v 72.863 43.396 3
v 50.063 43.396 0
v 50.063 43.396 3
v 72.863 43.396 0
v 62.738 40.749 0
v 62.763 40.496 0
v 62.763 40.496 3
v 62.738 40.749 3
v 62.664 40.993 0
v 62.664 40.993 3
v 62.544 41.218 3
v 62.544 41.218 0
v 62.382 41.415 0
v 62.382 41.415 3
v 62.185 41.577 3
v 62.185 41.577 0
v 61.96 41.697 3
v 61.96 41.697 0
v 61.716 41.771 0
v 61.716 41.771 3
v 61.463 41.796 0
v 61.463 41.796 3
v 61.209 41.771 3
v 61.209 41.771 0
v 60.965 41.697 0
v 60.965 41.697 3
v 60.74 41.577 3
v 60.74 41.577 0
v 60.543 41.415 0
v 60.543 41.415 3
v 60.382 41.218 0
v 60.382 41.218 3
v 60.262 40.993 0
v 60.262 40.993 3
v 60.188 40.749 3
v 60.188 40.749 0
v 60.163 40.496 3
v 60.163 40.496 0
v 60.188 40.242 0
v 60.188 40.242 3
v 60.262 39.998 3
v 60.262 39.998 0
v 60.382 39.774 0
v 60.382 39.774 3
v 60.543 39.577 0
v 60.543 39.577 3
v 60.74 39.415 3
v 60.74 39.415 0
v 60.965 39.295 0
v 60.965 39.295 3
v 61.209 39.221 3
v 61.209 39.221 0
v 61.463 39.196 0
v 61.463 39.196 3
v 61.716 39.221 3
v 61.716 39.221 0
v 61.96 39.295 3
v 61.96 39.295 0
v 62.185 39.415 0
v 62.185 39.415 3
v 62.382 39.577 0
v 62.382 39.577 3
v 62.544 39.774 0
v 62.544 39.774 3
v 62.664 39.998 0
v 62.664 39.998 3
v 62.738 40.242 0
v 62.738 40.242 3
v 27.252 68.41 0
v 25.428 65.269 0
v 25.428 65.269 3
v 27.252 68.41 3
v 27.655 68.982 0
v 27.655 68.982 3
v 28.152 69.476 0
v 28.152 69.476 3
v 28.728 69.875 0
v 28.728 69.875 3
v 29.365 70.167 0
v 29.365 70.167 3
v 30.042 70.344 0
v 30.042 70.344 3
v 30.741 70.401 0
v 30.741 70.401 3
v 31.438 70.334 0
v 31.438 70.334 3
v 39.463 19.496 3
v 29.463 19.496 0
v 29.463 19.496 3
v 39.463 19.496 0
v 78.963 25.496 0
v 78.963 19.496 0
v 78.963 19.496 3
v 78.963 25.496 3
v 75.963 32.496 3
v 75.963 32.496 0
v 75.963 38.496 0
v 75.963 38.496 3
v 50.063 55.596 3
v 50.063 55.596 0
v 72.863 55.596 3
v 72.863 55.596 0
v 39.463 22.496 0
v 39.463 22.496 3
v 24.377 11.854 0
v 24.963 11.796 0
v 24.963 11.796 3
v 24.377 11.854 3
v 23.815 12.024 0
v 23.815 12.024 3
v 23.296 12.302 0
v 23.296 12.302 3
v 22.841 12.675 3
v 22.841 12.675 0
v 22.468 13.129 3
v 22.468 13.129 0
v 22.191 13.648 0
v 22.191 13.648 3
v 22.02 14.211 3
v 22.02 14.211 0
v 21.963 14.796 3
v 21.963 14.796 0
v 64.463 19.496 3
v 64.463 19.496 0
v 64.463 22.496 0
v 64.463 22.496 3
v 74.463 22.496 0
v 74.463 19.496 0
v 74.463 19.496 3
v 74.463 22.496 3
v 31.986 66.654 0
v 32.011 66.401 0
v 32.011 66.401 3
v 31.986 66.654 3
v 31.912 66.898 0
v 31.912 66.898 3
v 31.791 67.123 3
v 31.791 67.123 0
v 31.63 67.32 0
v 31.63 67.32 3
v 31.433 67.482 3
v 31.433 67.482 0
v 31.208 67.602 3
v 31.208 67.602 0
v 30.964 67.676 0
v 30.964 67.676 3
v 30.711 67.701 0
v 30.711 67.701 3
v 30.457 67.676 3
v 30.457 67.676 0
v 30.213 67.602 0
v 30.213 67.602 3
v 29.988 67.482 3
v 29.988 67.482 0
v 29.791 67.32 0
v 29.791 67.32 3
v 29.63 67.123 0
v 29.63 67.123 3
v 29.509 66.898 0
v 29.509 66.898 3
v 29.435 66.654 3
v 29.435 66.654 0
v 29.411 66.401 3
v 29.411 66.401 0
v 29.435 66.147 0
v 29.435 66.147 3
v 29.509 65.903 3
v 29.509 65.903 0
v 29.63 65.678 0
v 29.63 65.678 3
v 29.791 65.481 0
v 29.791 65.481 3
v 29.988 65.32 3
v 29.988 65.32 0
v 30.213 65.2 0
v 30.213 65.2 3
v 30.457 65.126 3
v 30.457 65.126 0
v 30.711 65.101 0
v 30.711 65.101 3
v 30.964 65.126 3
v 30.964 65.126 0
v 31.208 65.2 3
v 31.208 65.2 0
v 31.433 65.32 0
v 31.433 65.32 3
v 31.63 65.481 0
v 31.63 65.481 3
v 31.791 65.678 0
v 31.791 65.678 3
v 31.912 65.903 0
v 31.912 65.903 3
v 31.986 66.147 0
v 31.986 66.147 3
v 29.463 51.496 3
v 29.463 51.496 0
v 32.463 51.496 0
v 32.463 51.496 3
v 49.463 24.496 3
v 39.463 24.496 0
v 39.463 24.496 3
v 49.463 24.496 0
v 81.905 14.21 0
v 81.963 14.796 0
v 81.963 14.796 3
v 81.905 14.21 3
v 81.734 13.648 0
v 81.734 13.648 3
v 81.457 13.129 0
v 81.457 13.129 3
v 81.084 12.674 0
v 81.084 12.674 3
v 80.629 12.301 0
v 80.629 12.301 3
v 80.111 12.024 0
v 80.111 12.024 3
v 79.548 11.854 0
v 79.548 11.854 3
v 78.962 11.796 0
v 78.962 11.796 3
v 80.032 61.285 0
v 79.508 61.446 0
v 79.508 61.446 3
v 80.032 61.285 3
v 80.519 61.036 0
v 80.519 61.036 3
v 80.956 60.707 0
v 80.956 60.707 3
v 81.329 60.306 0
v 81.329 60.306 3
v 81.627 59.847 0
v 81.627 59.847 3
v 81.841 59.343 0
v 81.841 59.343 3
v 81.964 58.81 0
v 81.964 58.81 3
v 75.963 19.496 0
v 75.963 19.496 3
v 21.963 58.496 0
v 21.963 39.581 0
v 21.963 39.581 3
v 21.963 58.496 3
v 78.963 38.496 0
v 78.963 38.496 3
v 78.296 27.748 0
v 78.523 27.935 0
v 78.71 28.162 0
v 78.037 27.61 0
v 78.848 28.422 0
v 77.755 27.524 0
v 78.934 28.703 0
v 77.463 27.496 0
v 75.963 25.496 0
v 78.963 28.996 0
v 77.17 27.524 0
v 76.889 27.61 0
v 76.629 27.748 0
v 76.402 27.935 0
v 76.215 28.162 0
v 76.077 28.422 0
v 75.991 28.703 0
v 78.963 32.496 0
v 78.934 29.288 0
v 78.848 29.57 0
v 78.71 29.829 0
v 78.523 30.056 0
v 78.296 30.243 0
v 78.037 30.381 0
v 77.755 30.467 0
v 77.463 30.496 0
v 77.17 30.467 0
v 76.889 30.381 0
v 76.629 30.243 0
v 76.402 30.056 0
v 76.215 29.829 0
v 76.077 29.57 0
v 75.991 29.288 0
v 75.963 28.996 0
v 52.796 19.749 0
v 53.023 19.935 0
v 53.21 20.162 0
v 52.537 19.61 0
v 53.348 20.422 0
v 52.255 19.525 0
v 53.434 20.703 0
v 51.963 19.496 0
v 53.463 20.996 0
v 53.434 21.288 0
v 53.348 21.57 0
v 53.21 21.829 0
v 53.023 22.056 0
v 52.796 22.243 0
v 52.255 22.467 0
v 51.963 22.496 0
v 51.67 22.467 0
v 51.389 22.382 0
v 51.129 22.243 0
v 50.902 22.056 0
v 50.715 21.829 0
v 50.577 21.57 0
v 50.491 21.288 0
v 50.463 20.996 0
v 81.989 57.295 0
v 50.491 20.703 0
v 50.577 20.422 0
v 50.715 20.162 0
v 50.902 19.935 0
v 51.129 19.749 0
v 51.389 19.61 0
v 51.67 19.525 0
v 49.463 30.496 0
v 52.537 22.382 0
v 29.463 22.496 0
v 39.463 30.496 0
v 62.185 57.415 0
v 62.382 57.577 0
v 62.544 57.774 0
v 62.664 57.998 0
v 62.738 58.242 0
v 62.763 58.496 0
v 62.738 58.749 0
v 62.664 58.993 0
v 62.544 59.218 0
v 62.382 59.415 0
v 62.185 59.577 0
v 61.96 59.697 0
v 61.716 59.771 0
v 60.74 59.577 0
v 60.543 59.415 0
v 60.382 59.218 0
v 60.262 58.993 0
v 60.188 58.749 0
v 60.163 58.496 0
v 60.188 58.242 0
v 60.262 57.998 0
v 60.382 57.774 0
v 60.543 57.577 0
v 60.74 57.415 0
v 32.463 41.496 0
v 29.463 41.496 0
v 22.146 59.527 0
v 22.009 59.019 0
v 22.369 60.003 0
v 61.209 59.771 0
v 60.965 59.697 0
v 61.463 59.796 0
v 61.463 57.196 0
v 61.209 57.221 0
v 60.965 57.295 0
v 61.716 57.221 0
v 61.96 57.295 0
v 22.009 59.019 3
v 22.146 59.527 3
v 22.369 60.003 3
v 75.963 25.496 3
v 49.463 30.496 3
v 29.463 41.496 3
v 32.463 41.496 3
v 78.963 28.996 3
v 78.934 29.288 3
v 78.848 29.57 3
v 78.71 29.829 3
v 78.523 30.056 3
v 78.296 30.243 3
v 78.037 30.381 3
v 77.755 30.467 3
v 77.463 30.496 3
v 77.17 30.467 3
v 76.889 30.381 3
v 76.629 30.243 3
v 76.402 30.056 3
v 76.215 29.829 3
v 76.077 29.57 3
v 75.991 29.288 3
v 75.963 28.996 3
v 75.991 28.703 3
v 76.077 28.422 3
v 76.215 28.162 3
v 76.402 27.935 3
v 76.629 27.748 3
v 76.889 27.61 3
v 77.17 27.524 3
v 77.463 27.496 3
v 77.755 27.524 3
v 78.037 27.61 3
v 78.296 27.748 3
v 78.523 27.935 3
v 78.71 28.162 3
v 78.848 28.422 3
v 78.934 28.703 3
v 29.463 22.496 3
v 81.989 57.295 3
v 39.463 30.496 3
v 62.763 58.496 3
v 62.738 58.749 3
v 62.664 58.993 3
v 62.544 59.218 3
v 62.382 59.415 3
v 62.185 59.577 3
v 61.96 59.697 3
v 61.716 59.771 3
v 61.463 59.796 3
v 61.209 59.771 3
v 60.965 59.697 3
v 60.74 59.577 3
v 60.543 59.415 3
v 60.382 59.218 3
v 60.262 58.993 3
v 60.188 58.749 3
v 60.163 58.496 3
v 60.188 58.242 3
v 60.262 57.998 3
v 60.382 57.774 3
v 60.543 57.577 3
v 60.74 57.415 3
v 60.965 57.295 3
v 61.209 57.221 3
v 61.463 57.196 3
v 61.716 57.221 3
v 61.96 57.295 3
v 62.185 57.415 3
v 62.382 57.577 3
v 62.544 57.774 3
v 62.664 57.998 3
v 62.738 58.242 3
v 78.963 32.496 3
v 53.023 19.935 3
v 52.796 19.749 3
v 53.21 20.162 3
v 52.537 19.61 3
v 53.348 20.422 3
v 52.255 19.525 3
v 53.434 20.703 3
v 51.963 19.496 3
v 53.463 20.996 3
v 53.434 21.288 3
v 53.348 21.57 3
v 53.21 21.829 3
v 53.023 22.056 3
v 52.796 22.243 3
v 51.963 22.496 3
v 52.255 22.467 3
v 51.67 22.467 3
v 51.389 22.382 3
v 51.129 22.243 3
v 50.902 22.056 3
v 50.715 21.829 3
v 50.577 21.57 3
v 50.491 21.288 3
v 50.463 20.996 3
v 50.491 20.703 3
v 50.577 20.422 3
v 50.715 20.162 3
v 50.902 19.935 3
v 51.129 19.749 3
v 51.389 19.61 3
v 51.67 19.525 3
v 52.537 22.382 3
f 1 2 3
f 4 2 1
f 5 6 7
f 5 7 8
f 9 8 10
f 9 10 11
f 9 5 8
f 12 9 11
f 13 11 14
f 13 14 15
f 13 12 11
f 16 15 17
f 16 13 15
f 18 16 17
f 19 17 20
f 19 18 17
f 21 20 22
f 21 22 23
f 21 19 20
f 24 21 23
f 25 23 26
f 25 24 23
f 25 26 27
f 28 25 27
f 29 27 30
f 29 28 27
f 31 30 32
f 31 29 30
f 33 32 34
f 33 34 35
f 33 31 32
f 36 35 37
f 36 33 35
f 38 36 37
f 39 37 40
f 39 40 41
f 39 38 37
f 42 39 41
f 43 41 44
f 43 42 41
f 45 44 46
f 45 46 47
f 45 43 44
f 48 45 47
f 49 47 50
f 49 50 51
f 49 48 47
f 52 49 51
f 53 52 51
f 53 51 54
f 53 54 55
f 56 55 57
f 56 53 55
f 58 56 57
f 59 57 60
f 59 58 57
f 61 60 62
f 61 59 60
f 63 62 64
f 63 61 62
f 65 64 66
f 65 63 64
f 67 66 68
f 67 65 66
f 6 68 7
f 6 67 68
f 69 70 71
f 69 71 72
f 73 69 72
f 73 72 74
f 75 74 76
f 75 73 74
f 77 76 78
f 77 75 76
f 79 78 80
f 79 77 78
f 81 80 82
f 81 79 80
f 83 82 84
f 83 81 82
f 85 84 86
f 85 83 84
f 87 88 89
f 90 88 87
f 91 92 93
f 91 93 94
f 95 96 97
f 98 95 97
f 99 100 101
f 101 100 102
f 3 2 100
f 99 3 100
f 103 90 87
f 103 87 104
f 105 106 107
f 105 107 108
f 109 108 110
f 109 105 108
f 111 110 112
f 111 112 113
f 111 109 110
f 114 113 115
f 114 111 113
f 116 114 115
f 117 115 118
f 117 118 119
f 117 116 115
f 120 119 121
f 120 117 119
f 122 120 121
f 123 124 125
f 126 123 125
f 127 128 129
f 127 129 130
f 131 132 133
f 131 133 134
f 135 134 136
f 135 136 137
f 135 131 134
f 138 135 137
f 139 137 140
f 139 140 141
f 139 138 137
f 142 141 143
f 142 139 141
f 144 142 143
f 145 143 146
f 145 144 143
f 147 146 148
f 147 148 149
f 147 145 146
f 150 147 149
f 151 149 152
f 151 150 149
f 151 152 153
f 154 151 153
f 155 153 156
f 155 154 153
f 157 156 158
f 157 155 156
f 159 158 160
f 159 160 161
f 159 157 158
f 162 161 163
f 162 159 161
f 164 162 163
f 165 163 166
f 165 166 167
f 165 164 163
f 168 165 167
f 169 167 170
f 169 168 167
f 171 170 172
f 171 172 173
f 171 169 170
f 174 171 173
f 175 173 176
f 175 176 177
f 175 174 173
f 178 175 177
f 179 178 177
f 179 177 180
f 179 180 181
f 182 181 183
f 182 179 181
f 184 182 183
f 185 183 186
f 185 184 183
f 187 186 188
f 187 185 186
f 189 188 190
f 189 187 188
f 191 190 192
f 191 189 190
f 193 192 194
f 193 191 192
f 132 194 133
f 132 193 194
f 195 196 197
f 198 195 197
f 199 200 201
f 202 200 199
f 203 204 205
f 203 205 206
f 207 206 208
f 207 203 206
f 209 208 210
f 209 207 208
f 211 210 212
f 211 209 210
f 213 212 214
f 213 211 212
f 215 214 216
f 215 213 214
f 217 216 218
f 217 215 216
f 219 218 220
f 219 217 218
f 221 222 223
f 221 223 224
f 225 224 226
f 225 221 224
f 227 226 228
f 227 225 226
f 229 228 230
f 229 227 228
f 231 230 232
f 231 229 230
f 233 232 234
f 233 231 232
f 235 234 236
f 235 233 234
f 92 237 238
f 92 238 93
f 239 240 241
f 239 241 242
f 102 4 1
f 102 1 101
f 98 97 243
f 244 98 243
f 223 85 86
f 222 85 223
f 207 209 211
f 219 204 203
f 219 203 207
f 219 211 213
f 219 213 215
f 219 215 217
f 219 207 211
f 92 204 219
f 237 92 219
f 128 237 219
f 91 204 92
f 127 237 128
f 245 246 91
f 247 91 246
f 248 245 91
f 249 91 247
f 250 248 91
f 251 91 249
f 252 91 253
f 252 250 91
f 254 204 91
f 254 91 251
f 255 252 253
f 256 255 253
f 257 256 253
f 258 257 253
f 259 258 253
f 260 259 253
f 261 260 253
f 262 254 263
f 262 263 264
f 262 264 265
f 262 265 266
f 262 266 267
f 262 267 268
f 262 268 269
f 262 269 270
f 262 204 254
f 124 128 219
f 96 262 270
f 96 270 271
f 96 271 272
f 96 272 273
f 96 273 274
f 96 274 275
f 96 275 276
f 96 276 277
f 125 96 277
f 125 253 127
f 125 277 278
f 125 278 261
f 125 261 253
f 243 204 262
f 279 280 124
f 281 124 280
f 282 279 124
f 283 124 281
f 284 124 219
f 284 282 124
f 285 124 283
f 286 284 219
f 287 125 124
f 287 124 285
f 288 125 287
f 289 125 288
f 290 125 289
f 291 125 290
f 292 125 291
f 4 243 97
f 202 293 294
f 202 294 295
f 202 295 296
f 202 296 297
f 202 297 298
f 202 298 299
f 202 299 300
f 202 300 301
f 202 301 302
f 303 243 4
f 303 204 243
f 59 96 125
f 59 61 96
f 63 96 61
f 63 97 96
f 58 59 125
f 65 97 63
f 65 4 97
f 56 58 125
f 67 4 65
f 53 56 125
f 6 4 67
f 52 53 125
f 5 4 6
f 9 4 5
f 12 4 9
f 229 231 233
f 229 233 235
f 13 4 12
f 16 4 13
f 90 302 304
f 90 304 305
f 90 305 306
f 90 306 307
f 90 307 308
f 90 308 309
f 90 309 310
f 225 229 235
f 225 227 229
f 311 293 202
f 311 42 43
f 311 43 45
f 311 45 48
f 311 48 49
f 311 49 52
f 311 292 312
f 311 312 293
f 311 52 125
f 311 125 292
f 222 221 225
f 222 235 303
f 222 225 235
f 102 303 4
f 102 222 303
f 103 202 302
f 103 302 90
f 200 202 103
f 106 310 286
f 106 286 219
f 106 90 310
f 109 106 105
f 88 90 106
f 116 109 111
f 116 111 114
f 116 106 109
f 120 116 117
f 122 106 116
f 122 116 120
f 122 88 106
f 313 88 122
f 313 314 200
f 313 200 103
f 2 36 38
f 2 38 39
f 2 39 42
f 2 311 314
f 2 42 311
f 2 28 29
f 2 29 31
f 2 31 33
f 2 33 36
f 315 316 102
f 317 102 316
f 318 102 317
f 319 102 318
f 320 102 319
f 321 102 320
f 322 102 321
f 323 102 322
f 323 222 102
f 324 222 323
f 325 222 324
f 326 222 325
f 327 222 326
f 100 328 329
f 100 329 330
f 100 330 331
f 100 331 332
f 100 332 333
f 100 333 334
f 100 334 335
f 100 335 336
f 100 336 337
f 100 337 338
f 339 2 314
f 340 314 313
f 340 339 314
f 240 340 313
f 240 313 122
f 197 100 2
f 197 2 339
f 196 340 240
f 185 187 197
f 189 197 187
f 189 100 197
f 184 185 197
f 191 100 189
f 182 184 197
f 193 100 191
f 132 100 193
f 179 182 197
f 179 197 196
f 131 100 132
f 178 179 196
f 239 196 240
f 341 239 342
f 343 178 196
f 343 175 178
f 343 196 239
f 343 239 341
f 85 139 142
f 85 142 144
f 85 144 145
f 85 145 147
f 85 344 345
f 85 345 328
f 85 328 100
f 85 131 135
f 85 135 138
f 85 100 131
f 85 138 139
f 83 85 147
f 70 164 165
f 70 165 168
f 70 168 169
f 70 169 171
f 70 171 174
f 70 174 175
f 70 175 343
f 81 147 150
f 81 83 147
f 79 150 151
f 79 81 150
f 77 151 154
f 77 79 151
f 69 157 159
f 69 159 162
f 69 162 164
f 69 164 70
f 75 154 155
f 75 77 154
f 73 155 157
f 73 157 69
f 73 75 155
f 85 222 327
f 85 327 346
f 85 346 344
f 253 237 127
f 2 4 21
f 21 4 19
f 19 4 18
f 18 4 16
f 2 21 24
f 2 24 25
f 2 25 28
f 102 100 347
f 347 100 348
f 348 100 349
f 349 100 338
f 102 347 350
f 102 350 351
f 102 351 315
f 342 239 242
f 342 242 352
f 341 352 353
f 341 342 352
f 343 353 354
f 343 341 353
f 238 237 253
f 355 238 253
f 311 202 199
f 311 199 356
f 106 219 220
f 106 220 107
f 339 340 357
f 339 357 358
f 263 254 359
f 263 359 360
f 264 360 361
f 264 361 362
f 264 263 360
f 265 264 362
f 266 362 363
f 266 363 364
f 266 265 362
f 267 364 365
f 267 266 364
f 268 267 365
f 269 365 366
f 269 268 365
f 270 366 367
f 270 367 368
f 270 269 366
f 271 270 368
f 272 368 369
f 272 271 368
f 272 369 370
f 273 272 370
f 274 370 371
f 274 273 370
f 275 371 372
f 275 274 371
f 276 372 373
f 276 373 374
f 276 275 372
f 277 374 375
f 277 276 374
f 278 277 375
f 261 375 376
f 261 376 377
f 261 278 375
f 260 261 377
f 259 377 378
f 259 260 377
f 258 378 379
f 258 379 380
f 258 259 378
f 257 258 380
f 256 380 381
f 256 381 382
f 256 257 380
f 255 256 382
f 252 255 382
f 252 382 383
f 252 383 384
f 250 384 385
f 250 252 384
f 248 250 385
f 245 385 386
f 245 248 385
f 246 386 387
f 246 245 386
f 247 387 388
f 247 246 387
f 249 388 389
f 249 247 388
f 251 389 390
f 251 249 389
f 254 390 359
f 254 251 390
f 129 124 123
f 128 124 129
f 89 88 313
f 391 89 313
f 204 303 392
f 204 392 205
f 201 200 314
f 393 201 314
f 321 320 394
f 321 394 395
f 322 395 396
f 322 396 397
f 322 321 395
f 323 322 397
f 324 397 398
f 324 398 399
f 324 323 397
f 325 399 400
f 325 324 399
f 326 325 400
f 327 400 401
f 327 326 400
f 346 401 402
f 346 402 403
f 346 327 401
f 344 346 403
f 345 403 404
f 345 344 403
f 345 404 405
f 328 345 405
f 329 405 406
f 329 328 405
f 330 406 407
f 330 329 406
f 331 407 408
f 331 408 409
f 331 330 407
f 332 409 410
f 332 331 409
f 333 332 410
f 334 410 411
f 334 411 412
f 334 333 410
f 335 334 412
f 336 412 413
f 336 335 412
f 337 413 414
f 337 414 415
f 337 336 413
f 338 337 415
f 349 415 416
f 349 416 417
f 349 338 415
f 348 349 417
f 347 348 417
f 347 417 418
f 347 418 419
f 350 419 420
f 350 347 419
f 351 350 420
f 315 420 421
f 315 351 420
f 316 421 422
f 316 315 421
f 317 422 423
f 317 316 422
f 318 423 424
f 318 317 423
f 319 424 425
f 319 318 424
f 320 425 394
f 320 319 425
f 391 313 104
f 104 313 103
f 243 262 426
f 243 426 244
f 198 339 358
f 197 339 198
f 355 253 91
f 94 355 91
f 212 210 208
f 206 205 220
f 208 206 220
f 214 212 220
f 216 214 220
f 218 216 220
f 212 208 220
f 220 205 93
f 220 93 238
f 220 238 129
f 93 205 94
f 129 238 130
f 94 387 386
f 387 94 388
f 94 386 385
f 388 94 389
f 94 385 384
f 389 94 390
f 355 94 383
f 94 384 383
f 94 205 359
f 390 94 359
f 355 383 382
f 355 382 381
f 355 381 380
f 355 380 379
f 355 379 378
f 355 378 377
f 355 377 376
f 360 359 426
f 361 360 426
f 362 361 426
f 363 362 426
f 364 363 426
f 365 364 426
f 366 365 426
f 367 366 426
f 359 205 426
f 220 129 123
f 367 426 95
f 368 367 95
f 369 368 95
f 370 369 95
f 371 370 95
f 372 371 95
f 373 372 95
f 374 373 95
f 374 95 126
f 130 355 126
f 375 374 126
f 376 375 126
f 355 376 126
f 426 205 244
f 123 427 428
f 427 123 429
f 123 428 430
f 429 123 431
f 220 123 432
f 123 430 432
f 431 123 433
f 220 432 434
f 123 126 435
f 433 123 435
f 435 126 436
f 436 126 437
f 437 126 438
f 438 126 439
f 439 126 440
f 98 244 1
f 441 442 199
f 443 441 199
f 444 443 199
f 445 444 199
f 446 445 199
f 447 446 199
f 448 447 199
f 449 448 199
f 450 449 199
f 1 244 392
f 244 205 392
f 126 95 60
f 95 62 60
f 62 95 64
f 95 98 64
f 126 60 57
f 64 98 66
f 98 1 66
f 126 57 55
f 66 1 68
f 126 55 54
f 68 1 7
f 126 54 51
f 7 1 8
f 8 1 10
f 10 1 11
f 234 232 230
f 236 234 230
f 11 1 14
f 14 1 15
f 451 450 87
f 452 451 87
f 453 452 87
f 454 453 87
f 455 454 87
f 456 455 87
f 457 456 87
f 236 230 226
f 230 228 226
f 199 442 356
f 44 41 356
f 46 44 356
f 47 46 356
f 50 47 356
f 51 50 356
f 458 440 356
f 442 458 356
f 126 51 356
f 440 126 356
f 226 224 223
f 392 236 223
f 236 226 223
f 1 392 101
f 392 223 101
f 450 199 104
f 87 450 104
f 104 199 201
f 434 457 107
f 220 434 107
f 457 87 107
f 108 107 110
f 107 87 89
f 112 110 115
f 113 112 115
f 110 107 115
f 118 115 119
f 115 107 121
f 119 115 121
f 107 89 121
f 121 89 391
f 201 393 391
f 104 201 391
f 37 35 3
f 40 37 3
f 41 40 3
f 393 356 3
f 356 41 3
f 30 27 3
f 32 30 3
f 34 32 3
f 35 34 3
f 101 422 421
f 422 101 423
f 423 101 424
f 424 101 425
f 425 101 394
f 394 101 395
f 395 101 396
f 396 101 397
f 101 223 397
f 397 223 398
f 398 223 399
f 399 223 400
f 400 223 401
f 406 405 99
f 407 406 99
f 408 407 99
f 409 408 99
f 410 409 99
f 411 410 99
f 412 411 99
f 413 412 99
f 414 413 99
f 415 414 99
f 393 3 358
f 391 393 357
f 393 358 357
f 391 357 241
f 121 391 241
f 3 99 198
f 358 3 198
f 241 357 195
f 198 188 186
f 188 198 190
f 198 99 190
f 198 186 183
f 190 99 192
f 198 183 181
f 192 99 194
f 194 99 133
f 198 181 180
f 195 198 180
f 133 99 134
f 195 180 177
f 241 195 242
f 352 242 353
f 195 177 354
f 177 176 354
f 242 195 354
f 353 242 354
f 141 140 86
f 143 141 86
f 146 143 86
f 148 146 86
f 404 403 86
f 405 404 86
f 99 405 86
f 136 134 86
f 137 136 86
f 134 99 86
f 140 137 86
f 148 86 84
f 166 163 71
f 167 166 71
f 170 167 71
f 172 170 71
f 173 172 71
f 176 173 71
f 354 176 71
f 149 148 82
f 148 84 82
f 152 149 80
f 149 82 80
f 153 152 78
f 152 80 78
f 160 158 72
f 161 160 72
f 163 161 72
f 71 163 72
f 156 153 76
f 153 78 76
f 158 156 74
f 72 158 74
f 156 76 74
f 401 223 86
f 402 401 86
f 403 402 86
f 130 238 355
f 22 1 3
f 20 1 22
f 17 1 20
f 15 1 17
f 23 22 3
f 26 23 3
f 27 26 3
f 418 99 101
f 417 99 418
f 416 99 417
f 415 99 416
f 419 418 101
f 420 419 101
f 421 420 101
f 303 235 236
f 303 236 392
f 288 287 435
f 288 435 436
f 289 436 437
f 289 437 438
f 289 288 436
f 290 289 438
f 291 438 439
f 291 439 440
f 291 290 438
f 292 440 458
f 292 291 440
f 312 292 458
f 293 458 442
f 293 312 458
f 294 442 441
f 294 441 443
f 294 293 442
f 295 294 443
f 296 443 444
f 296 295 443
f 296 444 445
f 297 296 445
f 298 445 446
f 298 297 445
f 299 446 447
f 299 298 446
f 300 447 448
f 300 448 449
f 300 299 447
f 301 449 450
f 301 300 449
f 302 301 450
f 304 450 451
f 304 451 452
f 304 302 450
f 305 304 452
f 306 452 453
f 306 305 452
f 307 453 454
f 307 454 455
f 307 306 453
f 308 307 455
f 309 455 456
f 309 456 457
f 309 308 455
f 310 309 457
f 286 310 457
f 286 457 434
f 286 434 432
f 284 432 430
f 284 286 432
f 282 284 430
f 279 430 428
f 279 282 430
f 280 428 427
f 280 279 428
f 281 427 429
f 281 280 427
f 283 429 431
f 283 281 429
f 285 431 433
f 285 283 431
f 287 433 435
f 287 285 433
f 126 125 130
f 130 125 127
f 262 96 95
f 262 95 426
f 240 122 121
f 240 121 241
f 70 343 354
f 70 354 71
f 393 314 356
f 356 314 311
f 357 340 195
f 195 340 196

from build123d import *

# Parameters (mm, degrees)
MODEL_R             = 1.3
MODEL_R_2           = 1.500000002
MODEL_W             = 3
MODEL_H             = 10
MODEL_W_2           = 10
MODEL_H_2           = 3
MODEL_H_3           = 6
MODEL_W_3           = 22.8
MODEL_H_4           = 12.2
BOSS_EXTRUDE1_DEPTH = 3


with BuildPart() as part:
    # Model → Boss-Extrude1 (new body)
    with BuildSketch(Plane.XY):
        with BuildLine():
            Line((21.96271471, 39.580829954), (21.96276757, 58.495922142))
            ThreePointArc((21.96276757, 58.495922142), (22.066046655, 59.276171923), (22.368675297, 60.00272006))
            Line((22.368675297, 60.00272006), (25.427717727, 65.269480806))
            Line((25.427717727, 65.269480806), (27.25161841, 68.40969502))
            ThreePointArc((27.25161841, 68.40969502), (29.03985645, 70.035063012), (31.437828278, 70.333973552))
            Line((31.437828278, 70.333973552), (79.508282697, 61.445627037))
            ThreePointArc((79.508282697, 61.445627037), (81.151311996, 60.514547069), (81.963503617, 58.809613066))
            Line((81.963503617, 58.809613066), (81.989341148, 57.295464993))
            Line((81.989341148, 57.295464993), (81.962758854, 14.795654622))
            ThreePointArc((81.962758854, 14.795654622), (81.08382665, 12.674474539), (78.962495601, 11.795906758))
            Line((78.962495601, 11.795906758), (24.962535775, 11.795906758))
            ThreePointArc((24.962535775, 11.795906758), (22.841288266, 12.674619651), (21.962651159, 14.795898552))
            Line((21.962651159, 14.795898552), (21.96271471, 39.580829954))
        make_face()
        with Locations((61.462672705, 58.495778552)):
            Circle(MODEL_R, mode=Mode.SUBTRACT)
        with Locations((61.462672705, 40.495778552)):
            Circle(MODEL_R, mode=Mode.SUBTRACT)
        with Locations((30.710508107, 66.400677282)):
            Circle(MODEL_R, mode=Mode.SUBTRACT)
        with Locations((51.962675263, 20.995768297)):
            Circle(MODEL_R_2, mode=Mode.SUBTRACT)
        with Locations((77.462616288, 28.995637525)):
            Circle(MODEL_R_2, mode=Mode.SUBTRACT)
        with Locations((30.962567569, 46.495883681)):
            Rectangle(MODEL_W, MODEL_H, mode=Mode.SUBTRACT)
        with Locations((34.462567569, 20.995883681)):
            Rectangle(MODEL_W_2, MODEL_H_2, mode=Mode.SUBTRACT)
        with Locations((69.462567569, 20.995883681)):
            Rectangle(MODEL_W_2, MODEL_H_2, mode=Mode.SUBTRACT)
        with Locations((77.462598338, 22.495645219)):
            Rectangle(MODEL_W, MODEL_H_3, mode=Mode.SUBTRACT)
        with Locations((61.462721415, 49.495778552)):
            Rectangle(MODEL_W_3, MODEL_H_4, mode=Mode.SUBTRACT)
        with Locations((77.462598338, 35.495645219)):
            Rectangle(MODEL_W, MODEL_H_3, mode=Mode.SUBTRACT)
        with Locations((44.462670134, 27.495883681)):
            Rectangle(MODEL_W_2, MODEL_H_3, mode=Mode.SUBTRACT)
    extrude(amount=BOSS_EXTRUDE1_DEPTH)


solid = part.part
